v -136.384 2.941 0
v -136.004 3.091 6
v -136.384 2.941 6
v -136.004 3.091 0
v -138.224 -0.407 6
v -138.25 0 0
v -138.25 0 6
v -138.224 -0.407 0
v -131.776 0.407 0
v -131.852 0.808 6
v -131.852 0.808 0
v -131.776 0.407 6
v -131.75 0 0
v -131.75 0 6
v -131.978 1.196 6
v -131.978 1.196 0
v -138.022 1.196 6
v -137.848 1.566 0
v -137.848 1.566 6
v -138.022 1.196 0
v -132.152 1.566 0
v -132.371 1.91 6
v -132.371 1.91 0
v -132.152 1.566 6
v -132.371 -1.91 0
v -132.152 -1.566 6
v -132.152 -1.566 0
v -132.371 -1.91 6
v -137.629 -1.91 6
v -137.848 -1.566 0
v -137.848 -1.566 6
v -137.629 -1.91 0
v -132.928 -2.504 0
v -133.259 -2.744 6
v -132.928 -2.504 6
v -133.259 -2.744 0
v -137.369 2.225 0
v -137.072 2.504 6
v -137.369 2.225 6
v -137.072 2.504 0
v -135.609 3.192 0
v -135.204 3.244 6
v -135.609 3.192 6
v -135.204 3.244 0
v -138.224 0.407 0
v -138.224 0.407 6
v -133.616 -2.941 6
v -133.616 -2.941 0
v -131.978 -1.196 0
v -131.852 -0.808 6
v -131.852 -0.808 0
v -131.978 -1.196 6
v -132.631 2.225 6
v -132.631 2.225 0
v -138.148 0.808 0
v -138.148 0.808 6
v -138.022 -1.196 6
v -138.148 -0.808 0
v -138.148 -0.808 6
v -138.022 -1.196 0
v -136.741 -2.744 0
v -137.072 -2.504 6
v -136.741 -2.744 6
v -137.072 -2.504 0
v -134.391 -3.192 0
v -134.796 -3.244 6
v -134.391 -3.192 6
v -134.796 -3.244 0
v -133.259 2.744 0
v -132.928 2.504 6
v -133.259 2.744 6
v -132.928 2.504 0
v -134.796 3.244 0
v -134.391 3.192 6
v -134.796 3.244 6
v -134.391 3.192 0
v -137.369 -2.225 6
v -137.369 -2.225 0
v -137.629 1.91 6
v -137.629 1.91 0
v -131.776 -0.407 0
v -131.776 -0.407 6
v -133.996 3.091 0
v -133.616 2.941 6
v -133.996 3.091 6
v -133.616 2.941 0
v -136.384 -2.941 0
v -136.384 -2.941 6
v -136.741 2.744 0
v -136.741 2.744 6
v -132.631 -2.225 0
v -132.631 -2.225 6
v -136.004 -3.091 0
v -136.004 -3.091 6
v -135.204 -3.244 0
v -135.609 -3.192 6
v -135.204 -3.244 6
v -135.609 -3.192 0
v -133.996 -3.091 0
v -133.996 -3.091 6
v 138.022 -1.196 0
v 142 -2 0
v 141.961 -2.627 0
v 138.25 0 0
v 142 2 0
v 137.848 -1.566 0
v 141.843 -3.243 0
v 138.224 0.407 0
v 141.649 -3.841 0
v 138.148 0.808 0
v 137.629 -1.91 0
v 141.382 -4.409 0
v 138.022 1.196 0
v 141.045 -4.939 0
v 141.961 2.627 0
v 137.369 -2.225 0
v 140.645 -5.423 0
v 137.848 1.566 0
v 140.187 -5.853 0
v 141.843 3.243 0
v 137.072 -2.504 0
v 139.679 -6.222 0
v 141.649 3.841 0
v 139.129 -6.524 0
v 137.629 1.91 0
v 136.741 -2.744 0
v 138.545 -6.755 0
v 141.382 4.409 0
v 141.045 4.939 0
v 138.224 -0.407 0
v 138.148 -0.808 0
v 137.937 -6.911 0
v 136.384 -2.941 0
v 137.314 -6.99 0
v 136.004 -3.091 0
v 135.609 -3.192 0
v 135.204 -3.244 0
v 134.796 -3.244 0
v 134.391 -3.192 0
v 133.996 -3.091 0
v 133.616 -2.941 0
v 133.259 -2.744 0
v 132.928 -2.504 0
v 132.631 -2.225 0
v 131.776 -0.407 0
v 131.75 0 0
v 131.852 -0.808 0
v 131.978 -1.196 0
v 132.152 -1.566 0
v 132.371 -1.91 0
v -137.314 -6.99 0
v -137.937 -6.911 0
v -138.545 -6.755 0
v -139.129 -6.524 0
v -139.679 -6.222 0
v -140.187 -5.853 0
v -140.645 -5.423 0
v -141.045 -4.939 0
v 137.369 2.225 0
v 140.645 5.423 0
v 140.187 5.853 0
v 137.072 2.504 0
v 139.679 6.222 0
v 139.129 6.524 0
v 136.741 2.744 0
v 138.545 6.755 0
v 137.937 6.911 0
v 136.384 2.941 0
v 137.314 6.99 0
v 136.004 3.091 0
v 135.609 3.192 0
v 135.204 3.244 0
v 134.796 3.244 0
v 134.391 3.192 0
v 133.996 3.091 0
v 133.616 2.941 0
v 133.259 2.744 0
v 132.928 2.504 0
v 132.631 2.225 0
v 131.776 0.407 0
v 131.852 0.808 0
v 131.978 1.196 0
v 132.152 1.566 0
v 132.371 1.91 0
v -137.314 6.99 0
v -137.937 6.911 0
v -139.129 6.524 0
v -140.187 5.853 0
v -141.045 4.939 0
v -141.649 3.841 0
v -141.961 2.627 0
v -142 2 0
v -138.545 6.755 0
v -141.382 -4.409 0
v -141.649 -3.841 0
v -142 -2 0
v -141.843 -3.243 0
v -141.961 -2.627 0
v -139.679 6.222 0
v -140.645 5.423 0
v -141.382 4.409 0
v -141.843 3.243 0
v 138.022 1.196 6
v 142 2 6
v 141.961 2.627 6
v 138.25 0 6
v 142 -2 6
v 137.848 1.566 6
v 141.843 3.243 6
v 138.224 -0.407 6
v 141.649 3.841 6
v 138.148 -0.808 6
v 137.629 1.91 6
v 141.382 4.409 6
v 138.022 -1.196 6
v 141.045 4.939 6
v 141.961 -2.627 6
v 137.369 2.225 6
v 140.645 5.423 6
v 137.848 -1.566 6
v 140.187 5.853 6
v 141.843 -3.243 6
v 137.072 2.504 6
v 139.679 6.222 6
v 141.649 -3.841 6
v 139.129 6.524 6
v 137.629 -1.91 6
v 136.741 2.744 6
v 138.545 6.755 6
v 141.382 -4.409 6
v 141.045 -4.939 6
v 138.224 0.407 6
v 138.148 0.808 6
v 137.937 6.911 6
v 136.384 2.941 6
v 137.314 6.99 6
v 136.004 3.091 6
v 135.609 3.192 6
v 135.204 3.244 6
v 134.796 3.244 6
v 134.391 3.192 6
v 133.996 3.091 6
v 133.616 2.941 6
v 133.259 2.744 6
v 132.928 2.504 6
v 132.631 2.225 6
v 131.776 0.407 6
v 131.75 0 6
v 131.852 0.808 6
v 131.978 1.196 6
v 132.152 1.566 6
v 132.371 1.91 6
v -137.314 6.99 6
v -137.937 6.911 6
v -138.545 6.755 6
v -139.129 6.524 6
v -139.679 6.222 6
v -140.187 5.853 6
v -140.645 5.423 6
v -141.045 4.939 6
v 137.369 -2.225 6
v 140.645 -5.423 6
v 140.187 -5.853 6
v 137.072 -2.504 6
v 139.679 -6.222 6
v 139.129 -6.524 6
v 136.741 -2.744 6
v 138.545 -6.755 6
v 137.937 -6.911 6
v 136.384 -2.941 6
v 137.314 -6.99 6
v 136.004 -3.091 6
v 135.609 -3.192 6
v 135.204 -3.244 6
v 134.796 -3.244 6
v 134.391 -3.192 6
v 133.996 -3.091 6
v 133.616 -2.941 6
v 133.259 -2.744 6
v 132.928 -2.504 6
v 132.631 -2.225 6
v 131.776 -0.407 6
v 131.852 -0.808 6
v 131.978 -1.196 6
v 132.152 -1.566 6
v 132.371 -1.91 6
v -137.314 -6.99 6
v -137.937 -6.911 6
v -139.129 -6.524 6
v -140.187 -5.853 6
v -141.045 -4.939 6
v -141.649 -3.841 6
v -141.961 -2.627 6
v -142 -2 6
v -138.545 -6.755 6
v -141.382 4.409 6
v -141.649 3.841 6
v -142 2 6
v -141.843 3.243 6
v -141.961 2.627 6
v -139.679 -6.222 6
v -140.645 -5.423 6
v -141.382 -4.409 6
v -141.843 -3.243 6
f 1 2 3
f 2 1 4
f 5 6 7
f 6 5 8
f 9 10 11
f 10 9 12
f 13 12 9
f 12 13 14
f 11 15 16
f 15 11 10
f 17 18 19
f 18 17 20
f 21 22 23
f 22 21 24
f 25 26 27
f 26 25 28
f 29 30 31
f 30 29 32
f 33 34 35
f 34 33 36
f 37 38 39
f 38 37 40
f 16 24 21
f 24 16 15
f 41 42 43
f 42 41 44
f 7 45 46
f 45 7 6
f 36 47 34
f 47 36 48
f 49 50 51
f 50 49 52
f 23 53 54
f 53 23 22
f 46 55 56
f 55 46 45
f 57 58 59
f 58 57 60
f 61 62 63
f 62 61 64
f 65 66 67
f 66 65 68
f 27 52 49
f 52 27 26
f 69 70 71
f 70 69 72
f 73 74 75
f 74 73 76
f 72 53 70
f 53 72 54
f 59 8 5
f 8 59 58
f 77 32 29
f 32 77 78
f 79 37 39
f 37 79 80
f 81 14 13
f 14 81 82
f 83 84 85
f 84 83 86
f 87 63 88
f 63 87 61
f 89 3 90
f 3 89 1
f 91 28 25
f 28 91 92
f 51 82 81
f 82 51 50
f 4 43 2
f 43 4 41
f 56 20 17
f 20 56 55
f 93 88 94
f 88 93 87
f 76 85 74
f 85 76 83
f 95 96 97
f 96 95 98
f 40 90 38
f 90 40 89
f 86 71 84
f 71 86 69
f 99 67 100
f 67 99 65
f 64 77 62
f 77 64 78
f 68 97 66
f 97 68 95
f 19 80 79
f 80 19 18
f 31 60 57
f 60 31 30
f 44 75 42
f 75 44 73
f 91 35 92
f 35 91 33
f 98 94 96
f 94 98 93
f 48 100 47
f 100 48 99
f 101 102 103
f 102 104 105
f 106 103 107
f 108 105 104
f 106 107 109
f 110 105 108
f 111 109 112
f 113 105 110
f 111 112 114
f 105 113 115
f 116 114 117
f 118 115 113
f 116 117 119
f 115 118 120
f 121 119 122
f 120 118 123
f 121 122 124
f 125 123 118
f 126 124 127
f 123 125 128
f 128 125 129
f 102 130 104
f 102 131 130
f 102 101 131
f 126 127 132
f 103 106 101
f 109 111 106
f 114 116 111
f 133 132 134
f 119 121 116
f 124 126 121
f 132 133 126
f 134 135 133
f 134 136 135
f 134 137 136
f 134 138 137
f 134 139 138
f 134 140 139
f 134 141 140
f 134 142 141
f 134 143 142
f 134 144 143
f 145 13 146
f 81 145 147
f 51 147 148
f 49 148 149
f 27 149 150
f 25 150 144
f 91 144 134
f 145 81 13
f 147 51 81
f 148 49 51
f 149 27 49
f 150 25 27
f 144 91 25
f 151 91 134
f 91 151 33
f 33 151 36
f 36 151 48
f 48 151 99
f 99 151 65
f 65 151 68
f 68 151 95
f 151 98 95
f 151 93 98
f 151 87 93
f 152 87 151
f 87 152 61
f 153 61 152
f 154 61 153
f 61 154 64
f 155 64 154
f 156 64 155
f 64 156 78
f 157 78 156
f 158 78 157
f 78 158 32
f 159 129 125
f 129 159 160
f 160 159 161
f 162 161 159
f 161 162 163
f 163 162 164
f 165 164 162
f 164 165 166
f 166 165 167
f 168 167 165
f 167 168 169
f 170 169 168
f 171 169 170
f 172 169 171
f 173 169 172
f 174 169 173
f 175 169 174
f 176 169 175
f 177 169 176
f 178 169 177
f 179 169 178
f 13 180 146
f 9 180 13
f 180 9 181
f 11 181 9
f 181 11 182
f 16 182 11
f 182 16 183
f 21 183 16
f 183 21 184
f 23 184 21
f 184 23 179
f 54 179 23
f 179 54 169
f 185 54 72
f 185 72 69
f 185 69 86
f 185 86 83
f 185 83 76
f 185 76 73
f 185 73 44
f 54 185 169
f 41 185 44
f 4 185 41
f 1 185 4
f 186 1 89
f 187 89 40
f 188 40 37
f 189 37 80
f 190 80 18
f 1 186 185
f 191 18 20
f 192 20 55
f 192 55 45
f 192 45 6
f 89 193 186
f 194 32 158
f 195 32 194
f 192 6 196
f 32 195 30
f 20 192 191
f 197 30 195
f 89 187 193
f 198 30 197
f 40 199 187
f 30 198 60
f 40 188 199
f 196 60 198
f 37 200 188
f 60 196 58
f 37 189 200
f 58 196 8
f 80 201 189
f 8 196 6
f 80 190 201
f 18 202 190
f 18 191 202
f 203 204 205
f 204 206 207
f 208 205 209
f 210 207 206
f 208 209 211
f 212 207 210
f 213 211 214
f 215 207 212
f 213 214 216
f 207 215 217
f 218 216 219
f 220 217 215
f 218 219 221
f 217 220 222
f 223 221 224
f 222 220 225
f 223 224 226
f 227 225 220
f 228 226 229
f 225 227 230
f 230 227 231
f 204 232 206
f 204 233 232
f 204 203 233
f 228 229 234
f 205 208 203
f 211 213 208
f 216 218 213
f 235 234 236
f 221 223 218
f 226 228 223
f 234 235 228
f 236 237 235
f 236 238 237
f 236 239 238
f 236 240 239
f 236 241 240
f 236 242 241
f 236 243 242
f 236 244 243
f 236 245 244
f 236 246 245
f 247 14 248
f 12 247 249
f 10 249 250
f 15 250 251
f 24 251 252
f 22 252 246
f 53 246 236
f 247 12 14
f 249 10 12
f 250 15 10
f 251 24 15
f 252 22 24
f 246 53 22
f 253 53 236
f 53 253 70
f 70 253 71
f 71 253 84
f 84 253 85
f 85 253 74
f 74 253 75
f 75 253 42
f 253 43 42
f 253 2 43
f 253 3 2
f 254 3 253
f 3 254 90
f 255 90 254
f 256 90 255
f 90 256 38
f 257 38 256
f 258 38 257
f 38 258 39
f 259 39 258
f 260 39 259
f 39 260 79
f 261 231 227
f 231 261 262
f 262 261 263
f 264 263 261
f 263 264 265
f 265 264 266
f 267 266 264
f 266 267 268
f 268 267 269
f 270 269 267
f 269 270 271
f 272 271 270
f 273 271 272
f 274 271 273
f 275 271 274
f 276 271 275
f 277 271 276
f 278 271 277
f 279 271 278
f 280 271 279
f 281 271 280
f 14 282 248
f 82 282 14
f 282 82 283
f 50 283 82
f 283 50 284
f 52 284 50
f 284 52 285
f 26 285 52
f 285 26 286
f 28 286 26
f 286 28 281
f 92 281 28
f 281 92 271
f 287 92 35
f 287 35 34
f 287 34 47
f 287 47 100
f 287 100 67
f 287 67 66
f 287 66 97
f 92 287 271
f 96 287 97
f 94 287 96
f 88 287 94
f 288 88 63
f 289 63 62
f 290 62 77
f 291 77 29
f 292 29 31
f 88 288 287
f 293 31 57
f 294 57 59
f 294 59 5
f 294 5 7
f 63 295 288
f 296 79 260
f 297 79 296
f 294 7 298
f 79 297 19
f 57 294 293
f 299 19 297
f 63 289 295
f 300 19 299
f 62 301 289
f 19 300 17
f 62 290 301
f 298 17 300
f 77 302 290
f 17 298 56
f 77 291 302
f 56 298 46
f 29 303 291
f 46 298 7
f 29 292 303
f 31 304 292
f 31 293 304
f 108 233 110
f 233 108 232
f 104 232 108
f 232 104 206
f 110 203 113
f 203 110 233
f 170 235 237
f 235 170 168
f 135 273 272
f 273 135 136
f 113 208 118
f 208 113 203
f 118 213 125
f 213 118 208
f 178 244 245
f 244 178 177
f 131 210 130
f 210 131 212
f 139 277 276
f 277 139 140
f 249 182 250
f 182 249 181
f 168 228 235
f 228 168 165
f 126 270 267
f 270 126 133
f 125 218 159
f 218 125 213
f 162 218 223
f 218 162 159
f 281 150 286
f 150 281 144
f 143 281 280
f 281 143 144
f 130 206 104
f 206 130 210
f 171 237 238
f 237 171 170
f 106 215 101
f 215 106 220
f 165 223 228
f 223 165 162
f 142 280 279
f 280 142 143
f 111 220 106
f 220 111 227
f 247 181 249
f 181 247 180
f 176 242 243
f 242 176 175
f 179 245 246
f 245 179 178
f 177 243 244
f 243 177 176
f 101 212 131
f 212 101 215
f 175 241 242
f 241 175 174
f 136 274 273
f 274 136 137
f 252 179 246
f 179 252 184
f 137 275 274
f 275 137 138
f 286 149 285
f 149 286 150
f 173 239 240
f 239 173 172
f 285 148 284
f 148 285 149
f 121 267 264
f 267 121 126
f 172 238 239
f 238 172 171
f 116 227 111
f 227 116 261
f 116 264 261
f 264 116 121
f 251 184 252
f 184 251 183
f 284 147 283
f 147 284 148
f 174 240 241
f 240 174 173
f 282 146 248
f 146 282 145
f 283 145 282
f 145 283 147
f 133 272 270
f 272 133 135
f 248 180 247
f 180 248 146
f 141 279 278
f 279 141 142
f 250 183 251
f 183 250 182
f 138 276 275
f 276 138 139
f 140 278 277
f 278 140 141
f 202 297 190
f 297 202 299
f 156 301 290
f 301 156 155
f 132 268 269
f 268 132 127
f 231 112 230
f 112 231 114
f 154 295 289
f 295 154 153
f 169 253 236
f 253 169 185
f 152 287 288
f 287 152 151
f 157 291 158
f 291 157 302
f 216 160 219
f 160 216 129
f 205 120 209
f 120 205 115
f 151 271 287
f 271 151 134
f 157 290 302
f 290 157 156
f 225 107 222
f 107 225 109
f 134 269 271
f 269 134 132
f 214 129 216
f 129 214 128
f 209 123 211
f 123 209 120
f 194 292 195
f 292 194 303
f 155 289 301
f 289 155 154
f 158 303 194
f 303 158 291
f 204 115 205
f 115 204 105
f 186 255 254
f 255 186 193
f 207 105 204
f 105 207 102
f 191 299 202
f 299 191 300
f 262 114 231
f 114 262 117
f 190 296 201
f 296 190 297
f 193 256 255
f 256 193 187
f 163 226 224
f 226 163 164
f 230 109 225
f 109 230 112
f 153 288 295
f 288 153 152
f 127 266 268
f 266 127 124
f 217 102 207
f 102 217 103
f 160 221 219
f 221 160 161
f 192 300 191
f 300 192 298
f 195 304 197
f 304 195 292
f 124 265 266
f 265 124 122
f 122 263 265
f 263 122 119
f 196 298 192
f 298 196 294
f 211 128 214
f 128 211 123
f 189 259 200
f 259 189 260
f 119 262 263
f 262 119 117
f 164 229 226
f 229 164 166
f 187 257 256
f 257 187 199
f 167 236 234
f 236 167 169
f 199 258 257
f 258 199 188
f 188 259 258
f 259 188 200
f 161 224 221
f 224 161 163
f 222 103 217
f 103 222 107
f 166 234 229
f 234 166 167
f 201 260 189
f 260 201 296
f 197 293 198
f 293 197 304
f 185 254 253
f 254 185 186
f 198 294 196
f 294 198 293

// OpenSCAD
$fn = 50;


difference() {
	union() {
		hull() {
			translate(v = [-137.0000000000, 2.0000000000, 0]) {
				cylinder(h = 6, r = 5);
			}
			translate(v = [137.0000000000, 2.0000000000, 0]) {
				cylinder(h = 6, r = 5);
			}
			translate(v = [-137.0000000000, -2.0000000000, 0]) {
				cylinder(h = 6, r = 5);
			}
			translate(v = [137.0000000000, -2.0000000000, 0]) {
				cylinder(h = 6, r = 5);
			}
		}
	}
	union() {
		translate(v = [-135.0000000000, 0.0000000000, 0]) {
			cylinder(h = 6, r = 3.2500000000);
		}
		translate(v = [135.0000000000, 0.0000000000, 0]) {
			cylinder(h = 6, r = 3.2500000000);
		}
		translate(v = [-135.0000000000, 0.0000000000, 0]) {
			cylinder(h = 6, r = 1.8000000000);
		}
		translate(v = [135.0000000000, 0.0000000000, 0]) {
			cylinder(h = 6, r = 1.8000000000);
		}
		translate(v = [-135.0000000000, 0.0000000000, 0]) {
			cylinder(h = 6, r = 1.8000000000);
		}
		translate(v = [135.0000000000, 0.0000000000, 0]) {
			cylinder(h = 6, r = 1.8000000000);
		}
		translate(v = [-135.0000000000, 0.0000000000, 0]) {
			cylinder(h = 6, r = 1.8000000000);
		}
		translate(v = [135.0000000000, 0.0000000000, 0]) {
			cylinder(h = 6, r = 1.8000000000);
		}
	}
}
